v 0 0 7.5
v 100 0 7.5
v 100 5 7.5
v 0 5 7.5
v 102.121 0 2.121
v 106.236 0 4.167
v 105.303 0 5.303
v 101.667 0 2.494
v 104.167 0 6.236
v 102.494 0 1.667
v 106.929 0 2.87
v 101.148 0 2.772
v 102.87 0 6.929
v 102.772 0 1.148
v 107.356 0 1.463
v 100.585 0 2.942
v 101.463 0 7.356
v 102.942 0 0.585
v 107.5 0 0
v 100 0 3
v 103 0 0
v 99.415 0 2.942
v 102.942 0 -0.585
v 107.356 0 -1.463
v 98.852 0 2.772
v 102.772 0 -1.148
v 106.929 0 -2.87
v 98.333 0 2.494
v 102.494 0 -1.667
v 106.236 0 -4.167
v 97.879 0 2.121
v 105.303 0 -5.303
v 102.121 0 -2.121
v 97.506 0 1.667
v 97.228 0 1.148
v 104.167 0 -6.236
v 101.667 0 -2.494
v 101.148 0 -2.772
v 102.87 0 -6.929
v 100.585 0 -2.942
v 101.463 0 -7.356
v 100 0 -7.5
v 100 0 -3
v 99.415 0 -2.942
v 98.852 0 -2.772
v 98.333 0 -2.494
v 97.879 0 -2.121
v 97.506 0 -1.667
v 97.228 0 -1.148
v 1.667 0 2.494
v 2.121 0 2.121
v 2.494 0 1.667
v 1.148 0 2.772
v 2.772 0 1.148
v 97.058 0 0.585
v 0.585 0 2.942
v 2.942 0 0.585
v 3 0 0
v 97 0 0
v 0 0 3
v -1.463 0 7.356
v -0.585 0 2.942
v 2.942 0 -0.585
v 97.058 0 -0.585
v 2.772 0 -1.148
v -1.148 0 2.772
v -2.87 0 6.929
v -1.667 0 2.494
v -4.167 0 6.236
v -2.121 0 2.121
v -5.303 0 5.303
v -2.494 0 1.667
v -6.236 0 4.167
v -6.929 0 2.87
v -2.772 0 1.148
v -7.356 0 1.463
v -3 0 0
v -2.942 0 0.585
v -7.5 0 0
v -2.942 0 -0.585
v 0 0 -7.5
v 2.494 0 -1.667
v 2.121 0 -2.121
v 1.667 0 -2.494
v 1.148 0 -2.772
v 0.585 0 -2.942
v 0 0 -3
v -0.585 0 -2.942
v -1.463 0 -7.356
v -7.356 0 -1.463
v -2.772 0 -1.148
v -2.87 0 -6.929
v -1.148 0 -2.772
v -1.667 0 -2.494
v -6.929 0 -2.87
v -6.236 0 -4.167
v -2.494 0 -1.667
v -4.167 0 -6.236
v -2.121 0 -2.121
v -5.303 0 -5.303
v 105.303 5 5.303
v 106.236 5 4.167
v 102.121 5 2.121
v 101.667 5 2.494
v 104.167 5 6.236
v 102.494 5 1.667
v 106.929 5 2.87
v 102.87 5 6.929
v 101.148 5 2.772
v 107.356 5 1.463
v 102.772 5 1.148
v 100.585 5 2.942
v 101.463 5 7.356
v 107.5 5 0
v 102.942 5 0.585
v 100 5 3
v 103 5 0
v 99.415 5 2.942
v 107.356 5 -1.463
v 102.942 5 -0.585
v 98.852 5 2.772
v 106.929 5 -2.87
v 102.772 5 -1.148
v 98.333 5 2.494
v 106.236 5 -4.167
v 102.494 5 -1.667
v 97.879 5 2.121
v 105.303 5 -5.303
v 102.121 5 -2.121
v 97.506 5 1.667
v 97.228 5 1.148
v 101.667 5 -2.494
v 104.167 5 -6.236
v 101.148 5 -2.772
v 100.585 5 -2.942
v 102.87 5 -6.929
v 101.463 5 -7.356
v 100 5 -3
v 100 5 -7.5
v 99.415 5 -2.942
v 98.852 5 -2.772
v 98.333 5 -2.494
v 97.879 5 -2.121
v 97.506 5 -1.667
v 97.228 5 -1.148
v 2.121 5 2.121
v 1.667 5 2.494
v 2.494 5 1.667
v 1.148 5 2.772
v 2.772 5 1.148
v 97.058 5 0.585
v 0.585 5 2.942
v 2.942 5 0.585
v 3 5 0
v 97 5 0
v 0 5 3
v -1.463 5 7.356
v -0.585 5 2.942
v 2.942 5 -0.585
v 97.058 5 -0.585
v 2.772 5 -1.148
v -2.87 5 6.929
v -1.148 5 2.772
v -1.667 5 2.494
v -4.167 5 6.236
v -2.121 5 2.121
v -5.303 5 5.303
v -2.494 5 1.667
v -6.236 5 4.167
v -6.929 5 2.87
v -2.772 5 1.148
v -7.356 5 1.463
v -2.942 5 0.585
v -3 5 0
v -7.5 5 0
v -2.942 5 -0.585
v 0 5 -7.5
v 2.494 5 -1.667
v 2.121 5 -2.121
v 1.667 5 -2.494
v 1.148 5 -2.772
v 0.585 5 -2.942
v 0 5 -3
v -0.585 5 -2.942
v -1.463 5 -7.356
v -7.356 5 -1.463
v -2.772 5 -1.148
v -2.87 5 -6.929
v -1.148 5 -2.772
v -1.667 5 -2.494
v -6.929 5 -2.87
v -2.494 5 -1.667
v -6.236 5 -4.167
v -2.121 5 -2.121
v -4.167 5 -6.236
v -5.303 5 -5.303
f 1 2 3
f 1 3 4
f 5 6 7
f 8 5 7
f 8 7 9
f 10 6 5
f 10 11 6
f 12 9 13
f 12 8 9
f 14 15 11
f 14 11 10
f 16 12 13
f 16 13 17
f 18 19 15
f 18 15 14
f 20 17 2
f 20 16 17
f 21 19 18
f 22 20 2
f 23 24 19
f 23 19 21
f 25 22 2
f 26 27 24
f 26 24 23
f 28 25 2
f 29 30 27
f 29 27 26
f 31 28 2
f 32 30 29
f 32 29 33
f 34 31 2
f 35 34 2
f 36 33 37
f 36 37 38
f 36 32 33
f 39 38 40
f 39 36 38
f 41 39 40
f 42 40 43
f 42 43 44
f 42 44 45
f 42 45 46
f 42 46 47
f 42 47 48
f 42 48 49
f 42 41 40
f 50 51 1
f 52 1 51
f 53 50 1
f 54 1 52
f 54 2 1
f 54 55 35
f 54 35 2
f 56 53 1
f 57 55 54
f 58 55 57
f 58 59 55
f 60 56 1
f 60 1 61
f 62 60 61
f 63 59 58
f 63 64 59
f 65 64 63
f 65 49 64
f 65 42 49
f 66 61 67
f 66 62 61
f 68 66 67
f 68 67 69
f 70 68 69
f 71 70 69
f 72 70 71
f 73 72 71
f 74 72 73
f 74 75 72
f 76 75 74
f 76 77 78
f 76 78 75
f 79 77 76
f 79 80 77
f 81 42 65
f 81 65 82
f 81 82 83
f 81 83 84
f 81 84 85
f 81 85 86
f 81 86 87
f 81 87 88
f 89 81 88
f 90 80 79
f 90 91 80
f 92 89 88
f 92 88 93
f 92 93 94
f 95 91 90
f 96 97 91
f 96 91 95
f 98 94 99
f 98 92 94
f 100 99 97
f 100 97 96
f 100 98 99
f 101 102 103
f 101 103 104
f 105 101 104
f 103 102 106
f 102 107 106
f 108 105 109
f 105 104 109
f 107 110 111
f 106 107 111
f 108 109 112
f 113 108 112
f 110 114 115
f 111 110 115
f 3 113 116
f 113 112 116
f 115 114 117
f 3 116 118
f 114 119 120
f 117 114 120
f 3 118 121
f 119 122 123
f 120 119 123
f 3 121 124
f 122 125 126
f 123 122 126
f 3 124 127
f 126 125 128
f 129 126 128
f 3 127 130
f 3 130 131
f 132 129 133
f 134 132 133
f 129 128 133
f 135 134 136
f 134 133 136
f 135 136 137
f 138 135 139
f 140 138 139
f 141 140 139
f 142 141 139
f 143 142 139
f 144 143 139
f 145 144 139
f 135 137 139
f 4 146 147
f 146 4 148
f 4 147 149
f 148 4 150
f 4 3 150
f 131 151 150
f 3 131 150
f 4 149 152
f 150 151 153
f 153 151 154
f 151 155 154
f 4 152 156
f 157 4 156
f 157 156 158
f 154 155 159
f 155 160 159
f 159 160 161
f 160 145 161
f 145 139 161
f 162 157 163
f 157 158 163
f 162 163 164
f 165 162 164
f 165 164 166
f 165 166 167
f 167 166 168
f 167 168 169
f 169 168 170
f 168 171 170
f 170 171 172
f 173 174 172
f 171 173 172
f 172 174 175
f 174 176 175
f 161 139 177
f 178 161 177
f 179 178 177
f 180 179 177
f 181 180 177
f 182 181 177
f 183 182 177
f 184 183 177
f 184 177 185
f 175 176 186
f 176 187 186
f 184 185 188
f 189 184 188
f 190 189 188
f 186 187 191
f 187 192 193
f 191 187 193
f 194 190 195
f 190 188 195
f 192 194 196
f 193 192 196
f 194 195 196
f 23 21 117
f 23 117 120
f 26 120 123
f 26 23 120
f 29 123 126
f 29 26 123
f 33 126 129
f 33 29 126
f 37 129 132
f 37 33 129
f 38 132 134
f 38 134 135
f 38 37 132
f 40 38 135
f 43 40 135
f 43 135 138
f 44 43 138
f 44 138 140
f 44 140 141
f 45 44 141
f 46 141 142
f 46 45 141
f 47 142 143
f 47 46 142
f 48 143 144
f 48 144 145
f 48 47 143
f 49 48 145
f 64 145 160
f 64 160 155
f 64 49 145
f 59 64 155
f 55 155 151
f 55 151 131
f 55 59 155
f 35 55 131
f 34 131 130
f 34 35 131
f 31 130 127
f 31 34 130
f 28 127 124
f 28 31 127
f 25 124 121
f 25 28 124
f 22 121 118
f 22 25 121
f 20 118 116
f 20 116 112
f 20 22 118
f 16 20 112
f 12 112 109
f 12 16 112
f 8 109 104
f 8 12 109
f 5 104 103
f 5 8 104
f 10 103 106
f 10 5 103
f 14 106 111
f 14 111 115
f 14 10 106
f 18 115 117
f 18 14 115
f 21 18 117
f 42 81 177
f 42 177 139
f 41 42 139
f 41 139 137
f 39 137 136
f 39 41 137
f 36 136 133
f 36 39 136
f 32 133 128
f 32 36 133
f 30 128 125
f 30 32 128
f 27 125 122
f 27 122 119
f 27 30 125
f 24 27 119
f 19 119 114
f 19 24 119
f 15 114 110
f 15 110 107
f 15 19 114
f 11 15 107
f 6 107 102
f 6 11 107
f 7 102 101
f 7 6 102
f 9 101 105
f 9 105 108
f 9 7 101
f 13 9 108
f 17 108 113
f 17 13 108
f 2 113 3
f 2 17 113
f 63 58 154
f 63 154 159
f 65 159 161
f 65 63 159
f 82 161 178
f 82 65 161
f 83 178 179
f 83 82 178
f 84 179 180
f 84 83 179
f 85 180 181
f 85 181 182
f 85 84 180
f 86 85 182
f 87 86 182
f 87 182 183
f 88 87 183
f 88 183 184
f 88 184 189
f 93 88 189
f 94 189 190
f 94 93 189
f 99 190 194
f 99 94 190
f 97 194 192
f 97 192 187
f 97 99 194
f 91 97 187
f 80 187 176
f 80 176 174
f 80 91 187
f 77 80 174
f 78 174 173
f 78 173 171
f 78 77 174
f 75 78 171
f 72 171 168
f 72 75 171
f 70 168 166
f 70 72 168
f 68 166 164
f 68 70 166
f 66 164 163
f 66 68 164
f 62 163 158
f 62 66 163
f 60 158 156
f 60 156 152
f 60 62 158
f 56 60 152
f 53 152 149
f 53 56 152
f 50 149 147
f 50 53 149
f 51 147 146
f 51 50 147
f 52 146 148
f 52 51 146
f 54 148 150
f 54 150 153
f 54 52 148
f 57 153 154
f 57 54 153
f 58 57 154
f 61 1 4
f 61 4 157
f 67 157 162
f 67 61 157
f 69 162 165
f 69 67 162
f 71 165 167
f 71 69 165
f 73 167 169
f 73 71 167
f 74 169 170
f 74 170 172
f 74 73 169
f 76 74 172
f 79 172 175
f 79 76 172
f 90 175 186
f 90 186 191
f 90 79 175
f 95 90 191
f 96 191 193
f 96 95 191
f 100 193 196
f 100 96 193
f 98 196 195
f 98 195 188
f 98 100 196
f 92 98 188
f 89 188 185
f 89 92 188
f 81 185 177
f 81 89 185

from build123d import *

# Parameters (mm, degrees)
SKETCH1_R           = 3
BOSS_EXTRUDE1_DEPTH = 5


with BuildPart() as part:
    # Sketch1 → Boss-Extrude1 (new body)
    with BuildSketch(Plane(origin=(0, 0, 0), x_dir=(1, 0, 0), z_dir=(0, 1, 0))):
        with BuildLine():
            Line((0, 7.5), (100, 7.5))
            ThreePointArc((100, 7.5), (107.5, 0), (100, -7.5))
            Line((100, -7.5), (0, -7.5))
            ThreePointArc((0, -7.5), (-7.5, 0), (0, 7.5))
        make_face()
        with Locations((100, 0)):
            Circle(SKETCH1_R, mode=Mode.SUBTRACT)
        Circle(SKETCH1_R, mode=Mode.SUBTRACT)
    extrude(amount=BOSS_EXTRUDE1_DEPTH)


solid = part.part
